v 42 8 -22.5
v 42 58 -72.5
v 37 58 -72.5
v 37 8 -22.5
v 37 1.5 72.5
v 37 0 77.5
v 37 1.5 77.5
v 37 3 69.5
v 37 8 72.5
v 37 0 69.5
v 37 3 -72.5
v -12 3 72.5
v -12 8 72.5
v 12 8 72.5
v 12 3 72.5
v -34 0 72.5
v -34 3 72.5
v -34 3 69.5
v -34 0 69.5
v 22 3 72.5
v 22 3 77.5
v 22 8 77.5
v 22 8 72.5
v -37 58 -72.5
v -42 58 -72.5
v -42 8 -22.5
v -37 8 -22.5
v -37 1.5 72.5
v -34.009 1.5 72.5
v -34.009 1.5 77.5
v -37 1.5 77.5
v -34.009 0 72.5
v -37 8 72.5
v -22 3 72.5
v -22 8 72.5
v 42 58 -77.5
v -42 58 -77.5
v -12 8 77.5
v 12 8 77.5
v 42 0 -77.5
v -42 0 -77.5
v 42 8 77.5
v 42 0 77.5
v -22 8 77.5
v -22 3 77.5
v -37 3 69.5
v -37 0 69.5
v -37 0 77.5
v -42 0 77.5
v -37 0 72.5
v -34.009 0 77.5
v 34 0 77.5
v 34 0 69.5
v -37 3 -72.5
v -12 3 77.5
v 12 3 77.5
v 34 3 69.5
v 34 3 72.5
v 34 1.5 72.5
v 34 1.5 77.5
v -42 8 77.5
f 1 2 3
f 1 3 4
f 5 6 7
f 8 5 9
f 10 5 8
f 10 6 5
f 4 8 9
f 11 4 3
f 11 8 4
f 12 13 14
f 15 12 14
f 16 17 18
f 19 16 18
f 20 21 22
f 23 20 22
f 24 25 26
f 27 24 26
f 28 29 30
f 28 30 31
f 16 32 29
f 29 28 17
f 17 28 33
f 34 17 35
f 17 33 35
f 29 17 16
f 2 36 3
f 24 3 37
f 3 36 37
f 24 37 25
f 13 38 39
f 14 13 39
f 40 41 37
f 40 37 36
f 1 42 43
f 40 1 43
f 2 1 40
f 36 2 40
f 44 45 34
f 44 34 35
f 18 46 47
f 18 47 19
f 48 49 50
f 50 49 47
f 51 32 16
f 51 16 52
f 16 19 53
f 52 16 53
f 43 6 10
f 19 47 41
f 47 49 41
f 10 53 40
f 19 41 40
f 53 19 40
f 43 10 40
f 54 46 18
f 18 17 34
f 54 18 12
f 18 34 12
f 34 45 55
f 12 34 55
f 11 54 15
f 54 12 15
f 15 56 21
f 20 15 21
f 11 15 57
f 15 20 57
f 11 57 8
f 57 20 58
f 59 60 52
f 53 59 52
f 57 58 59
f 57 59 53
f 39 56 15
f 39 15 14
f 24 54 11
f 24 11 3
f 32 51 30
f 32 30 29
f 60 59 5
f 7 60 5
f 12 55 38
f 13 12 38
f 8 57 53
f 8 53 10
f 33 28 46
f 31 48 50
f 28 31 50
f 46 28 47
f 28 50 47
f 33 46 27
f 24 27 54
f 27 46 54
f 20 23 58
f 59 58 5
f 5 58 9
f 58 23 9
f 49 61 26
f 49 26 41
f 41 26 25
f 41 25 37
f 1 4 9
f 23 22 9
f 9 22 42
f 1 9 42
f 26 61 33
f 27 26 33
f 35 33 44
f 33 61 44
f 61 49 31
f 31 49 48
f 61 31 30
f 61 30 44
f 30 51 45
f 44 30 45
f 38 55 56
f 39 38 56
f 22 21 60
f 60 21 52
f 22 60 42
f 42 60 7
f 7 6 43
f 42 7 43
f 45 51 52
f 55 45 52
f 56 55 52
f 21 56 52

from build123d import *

# Parameters (mm, degrees)
SKETCH1_W           = 84
SKETCH1_H           = 155
BOSS_EXTRUDE1_DEPTH = 3
SKETCH2_W           = 3
SKETCH2_H           = 3
CUT_EXTRUDE1_DEPTH  = 3
SKETCH3_W           = 5
SKETCH3_H           = 8
BOSS_EXTRUDE2_DEPTH = 155
SKETCH4_W           = 5
SKETCH4_H           = 8
BOSS_EXTRUDE3_DEPTH = 155
SKETCH5_W           = 5
SKETCH5_H           = 58
BOSS_EXTRUDE4_DEPTH = 84
BOSS_EXTRUDE5_DEPTH = 5
BOSS_EXTRUDE6_DEPTH = 5
SKETCH8_W           = 84
SKETCH8_H           = 8
BOSS_EXTRUDE8_DEPTH = 5
SKETCH10_W          = 10
SKETCH10_H          = 7.49718506
CUT_EXTRUDE2_DEPTH  = 5
SKETCH11_W          = 10
SKETCH11_H          = 10.666578164
CUT_EXTRUDE3_DEPTH  = 5
SKETCH12_W          = 2.991300293
SKETCH12_H          = 5
CUT_EXTRUDE4_DEPTH  = 1.5
CUT_EXTRUDE5_DEPTH  = 1.5


with BuildPart() as part:
    # Sketch1 → Boss-Extrude1 (new body)
    with BuildSketch(Plane(origin=(0, 0, 0), x_dir=(1, 0, 0), z_dir=(0, 1, 0))):
        Rectangle(SKETCH1_W, SKETCH1_H)
    extrude(amount=BOSS_EXTRUDE1_DEPTH)

    # Sketch2 → Cut-Extrude1 (cut)
    with BuildSketch(Plane(origin=(0, 3, 0), x_dir=(1, 0, 0), z_dir=(0, 1, 0))):
        with Locations((35.5, -71)):
            Rectangle(SKETCH2_W, SKETCH2_H)
        with Locations((-35.5, -71)):
            Rectangle(SKETCH2_W, SKETCH2_H)
    extrude(amount=-CUT_EXTRUDE1_DEPTH, mode=Mode.SUBTRACT)

    # Sketch3 → Boss-Extrude2 (add)
    with BuildSketch(Plane.XY.offset(77.5)):
        with Locations((39.5, 4)):
            Rectangle(SKETCH3_W, SKETCH3_H)
    extrude(amount=-BOSS_EXTRUDE2_DEPTH)

    # Sketch4 → Boss-Extrude3 (add)
    with BuildSketch(Plane.XY.offset(77.5)):
        with Locations((-39.5, 4)):
            Rectangle(SKETCH4_W, SKETCH4_H)
    extrude(amount=-BOSS_EXTRUDE3_DEPTH)

    # Sketch5 → Boss-Extrude4 (add)
    with BuildSketch(Plane.ZY.offset(42)):
        with Locations((-75, 29)):
            Rectangle(SKETCH5_W, SKETCH5_H)
    extrude(amount=-BOSS_EXTRUDE4_DEPTH)

    # Sketch6 → Boss-Extrude5 (add)
    with BuildSketch(Plane.ZY.offset(42)):
        Polygon((-72.5, 58), (-22.5, 8), (-74.300026141, 4.41684906), (-74.300026141, 56.199973859), align=None)
    extrude(amount=-BOSS_EXTRUDE5_DEPTH)

    # Sketch7 → Boss-Extrude6 (add)
    with BuildSketch(Plane(origin=(42, 0, 0), x_dir=(0, 0, -1), z_dir=(1, 0, 0))):
        Polygon((72.5, 58), (19.108860597, 4.608860597), (75.247556584, 4.608860597), (75.247556584, 53.916409465), align=None)
    extrude(amount=-BOSS_EXTRUDE6_DEPTH)

    # Sketch8 → Boss-Extrude8 (add)
    with BuildSketch(Plane.XY.offset(77.5)):
        with Locations((0, 4)):
            Rectangle(SKETCH8_W, SKETCH8_H)
    extrude(amount=-BOSS_EXTRUDE8_DEPTH)

    # Sketch10 → Cut-Extrude2 (cut)
    with BuildSketch(Plane.XY.offset(77.5)):
        with Locations((-17, 6.74859253)):
            Rectangle(SKETCH10_W, SKETCH10_H)
    extrude(amount=-CUT_EXTRUDE2_DEPTH, mode=Mode.SUBTRACT)

    # Sketch11 → Cut-Extrude3 (cut)
    with BuildSketch(Plane.XY.offset(77.5)):
        with Locations((17, 8.333289082)):
            Rectangle(SKETCH11_W, SKETCH11_H)
    extrude(amount=-CUT_EXTRUDE3_DEPTH, mode=Mode.SUBTRACT)

    # Sketch12 → Cut-Extrude4 (cut)
    with BuildSketch(Plane(origin=(0, 0, 0), x_dir=(-1, 0, 0), z_dir=(0, -1, 0))):
        with Locations((35.504349854, -75)):
            Rectangle(SKETCH12_W, SKETCH12_H)
    extrude(amount=-CUT_EXTRUDE4_DEPTH, mode=Mode.SUBTRACT)

    # Sketch13 → Cut-Extrude5 (cut)
    with BuildSketch(Plane(origin=(0, 0, 0), x_dir=(-1, 0, 0), z_dir=(0, -1, 0))):
        Polygon((-34, -72.5), (-34, -80.193887821), (-37, -80.075389367), (-37, -72.5), align=None)
    extrude(amount=-CUT_EXTRUDE5_DEPTH, mode=Mode.SUBTRACT)


solid = part.part
